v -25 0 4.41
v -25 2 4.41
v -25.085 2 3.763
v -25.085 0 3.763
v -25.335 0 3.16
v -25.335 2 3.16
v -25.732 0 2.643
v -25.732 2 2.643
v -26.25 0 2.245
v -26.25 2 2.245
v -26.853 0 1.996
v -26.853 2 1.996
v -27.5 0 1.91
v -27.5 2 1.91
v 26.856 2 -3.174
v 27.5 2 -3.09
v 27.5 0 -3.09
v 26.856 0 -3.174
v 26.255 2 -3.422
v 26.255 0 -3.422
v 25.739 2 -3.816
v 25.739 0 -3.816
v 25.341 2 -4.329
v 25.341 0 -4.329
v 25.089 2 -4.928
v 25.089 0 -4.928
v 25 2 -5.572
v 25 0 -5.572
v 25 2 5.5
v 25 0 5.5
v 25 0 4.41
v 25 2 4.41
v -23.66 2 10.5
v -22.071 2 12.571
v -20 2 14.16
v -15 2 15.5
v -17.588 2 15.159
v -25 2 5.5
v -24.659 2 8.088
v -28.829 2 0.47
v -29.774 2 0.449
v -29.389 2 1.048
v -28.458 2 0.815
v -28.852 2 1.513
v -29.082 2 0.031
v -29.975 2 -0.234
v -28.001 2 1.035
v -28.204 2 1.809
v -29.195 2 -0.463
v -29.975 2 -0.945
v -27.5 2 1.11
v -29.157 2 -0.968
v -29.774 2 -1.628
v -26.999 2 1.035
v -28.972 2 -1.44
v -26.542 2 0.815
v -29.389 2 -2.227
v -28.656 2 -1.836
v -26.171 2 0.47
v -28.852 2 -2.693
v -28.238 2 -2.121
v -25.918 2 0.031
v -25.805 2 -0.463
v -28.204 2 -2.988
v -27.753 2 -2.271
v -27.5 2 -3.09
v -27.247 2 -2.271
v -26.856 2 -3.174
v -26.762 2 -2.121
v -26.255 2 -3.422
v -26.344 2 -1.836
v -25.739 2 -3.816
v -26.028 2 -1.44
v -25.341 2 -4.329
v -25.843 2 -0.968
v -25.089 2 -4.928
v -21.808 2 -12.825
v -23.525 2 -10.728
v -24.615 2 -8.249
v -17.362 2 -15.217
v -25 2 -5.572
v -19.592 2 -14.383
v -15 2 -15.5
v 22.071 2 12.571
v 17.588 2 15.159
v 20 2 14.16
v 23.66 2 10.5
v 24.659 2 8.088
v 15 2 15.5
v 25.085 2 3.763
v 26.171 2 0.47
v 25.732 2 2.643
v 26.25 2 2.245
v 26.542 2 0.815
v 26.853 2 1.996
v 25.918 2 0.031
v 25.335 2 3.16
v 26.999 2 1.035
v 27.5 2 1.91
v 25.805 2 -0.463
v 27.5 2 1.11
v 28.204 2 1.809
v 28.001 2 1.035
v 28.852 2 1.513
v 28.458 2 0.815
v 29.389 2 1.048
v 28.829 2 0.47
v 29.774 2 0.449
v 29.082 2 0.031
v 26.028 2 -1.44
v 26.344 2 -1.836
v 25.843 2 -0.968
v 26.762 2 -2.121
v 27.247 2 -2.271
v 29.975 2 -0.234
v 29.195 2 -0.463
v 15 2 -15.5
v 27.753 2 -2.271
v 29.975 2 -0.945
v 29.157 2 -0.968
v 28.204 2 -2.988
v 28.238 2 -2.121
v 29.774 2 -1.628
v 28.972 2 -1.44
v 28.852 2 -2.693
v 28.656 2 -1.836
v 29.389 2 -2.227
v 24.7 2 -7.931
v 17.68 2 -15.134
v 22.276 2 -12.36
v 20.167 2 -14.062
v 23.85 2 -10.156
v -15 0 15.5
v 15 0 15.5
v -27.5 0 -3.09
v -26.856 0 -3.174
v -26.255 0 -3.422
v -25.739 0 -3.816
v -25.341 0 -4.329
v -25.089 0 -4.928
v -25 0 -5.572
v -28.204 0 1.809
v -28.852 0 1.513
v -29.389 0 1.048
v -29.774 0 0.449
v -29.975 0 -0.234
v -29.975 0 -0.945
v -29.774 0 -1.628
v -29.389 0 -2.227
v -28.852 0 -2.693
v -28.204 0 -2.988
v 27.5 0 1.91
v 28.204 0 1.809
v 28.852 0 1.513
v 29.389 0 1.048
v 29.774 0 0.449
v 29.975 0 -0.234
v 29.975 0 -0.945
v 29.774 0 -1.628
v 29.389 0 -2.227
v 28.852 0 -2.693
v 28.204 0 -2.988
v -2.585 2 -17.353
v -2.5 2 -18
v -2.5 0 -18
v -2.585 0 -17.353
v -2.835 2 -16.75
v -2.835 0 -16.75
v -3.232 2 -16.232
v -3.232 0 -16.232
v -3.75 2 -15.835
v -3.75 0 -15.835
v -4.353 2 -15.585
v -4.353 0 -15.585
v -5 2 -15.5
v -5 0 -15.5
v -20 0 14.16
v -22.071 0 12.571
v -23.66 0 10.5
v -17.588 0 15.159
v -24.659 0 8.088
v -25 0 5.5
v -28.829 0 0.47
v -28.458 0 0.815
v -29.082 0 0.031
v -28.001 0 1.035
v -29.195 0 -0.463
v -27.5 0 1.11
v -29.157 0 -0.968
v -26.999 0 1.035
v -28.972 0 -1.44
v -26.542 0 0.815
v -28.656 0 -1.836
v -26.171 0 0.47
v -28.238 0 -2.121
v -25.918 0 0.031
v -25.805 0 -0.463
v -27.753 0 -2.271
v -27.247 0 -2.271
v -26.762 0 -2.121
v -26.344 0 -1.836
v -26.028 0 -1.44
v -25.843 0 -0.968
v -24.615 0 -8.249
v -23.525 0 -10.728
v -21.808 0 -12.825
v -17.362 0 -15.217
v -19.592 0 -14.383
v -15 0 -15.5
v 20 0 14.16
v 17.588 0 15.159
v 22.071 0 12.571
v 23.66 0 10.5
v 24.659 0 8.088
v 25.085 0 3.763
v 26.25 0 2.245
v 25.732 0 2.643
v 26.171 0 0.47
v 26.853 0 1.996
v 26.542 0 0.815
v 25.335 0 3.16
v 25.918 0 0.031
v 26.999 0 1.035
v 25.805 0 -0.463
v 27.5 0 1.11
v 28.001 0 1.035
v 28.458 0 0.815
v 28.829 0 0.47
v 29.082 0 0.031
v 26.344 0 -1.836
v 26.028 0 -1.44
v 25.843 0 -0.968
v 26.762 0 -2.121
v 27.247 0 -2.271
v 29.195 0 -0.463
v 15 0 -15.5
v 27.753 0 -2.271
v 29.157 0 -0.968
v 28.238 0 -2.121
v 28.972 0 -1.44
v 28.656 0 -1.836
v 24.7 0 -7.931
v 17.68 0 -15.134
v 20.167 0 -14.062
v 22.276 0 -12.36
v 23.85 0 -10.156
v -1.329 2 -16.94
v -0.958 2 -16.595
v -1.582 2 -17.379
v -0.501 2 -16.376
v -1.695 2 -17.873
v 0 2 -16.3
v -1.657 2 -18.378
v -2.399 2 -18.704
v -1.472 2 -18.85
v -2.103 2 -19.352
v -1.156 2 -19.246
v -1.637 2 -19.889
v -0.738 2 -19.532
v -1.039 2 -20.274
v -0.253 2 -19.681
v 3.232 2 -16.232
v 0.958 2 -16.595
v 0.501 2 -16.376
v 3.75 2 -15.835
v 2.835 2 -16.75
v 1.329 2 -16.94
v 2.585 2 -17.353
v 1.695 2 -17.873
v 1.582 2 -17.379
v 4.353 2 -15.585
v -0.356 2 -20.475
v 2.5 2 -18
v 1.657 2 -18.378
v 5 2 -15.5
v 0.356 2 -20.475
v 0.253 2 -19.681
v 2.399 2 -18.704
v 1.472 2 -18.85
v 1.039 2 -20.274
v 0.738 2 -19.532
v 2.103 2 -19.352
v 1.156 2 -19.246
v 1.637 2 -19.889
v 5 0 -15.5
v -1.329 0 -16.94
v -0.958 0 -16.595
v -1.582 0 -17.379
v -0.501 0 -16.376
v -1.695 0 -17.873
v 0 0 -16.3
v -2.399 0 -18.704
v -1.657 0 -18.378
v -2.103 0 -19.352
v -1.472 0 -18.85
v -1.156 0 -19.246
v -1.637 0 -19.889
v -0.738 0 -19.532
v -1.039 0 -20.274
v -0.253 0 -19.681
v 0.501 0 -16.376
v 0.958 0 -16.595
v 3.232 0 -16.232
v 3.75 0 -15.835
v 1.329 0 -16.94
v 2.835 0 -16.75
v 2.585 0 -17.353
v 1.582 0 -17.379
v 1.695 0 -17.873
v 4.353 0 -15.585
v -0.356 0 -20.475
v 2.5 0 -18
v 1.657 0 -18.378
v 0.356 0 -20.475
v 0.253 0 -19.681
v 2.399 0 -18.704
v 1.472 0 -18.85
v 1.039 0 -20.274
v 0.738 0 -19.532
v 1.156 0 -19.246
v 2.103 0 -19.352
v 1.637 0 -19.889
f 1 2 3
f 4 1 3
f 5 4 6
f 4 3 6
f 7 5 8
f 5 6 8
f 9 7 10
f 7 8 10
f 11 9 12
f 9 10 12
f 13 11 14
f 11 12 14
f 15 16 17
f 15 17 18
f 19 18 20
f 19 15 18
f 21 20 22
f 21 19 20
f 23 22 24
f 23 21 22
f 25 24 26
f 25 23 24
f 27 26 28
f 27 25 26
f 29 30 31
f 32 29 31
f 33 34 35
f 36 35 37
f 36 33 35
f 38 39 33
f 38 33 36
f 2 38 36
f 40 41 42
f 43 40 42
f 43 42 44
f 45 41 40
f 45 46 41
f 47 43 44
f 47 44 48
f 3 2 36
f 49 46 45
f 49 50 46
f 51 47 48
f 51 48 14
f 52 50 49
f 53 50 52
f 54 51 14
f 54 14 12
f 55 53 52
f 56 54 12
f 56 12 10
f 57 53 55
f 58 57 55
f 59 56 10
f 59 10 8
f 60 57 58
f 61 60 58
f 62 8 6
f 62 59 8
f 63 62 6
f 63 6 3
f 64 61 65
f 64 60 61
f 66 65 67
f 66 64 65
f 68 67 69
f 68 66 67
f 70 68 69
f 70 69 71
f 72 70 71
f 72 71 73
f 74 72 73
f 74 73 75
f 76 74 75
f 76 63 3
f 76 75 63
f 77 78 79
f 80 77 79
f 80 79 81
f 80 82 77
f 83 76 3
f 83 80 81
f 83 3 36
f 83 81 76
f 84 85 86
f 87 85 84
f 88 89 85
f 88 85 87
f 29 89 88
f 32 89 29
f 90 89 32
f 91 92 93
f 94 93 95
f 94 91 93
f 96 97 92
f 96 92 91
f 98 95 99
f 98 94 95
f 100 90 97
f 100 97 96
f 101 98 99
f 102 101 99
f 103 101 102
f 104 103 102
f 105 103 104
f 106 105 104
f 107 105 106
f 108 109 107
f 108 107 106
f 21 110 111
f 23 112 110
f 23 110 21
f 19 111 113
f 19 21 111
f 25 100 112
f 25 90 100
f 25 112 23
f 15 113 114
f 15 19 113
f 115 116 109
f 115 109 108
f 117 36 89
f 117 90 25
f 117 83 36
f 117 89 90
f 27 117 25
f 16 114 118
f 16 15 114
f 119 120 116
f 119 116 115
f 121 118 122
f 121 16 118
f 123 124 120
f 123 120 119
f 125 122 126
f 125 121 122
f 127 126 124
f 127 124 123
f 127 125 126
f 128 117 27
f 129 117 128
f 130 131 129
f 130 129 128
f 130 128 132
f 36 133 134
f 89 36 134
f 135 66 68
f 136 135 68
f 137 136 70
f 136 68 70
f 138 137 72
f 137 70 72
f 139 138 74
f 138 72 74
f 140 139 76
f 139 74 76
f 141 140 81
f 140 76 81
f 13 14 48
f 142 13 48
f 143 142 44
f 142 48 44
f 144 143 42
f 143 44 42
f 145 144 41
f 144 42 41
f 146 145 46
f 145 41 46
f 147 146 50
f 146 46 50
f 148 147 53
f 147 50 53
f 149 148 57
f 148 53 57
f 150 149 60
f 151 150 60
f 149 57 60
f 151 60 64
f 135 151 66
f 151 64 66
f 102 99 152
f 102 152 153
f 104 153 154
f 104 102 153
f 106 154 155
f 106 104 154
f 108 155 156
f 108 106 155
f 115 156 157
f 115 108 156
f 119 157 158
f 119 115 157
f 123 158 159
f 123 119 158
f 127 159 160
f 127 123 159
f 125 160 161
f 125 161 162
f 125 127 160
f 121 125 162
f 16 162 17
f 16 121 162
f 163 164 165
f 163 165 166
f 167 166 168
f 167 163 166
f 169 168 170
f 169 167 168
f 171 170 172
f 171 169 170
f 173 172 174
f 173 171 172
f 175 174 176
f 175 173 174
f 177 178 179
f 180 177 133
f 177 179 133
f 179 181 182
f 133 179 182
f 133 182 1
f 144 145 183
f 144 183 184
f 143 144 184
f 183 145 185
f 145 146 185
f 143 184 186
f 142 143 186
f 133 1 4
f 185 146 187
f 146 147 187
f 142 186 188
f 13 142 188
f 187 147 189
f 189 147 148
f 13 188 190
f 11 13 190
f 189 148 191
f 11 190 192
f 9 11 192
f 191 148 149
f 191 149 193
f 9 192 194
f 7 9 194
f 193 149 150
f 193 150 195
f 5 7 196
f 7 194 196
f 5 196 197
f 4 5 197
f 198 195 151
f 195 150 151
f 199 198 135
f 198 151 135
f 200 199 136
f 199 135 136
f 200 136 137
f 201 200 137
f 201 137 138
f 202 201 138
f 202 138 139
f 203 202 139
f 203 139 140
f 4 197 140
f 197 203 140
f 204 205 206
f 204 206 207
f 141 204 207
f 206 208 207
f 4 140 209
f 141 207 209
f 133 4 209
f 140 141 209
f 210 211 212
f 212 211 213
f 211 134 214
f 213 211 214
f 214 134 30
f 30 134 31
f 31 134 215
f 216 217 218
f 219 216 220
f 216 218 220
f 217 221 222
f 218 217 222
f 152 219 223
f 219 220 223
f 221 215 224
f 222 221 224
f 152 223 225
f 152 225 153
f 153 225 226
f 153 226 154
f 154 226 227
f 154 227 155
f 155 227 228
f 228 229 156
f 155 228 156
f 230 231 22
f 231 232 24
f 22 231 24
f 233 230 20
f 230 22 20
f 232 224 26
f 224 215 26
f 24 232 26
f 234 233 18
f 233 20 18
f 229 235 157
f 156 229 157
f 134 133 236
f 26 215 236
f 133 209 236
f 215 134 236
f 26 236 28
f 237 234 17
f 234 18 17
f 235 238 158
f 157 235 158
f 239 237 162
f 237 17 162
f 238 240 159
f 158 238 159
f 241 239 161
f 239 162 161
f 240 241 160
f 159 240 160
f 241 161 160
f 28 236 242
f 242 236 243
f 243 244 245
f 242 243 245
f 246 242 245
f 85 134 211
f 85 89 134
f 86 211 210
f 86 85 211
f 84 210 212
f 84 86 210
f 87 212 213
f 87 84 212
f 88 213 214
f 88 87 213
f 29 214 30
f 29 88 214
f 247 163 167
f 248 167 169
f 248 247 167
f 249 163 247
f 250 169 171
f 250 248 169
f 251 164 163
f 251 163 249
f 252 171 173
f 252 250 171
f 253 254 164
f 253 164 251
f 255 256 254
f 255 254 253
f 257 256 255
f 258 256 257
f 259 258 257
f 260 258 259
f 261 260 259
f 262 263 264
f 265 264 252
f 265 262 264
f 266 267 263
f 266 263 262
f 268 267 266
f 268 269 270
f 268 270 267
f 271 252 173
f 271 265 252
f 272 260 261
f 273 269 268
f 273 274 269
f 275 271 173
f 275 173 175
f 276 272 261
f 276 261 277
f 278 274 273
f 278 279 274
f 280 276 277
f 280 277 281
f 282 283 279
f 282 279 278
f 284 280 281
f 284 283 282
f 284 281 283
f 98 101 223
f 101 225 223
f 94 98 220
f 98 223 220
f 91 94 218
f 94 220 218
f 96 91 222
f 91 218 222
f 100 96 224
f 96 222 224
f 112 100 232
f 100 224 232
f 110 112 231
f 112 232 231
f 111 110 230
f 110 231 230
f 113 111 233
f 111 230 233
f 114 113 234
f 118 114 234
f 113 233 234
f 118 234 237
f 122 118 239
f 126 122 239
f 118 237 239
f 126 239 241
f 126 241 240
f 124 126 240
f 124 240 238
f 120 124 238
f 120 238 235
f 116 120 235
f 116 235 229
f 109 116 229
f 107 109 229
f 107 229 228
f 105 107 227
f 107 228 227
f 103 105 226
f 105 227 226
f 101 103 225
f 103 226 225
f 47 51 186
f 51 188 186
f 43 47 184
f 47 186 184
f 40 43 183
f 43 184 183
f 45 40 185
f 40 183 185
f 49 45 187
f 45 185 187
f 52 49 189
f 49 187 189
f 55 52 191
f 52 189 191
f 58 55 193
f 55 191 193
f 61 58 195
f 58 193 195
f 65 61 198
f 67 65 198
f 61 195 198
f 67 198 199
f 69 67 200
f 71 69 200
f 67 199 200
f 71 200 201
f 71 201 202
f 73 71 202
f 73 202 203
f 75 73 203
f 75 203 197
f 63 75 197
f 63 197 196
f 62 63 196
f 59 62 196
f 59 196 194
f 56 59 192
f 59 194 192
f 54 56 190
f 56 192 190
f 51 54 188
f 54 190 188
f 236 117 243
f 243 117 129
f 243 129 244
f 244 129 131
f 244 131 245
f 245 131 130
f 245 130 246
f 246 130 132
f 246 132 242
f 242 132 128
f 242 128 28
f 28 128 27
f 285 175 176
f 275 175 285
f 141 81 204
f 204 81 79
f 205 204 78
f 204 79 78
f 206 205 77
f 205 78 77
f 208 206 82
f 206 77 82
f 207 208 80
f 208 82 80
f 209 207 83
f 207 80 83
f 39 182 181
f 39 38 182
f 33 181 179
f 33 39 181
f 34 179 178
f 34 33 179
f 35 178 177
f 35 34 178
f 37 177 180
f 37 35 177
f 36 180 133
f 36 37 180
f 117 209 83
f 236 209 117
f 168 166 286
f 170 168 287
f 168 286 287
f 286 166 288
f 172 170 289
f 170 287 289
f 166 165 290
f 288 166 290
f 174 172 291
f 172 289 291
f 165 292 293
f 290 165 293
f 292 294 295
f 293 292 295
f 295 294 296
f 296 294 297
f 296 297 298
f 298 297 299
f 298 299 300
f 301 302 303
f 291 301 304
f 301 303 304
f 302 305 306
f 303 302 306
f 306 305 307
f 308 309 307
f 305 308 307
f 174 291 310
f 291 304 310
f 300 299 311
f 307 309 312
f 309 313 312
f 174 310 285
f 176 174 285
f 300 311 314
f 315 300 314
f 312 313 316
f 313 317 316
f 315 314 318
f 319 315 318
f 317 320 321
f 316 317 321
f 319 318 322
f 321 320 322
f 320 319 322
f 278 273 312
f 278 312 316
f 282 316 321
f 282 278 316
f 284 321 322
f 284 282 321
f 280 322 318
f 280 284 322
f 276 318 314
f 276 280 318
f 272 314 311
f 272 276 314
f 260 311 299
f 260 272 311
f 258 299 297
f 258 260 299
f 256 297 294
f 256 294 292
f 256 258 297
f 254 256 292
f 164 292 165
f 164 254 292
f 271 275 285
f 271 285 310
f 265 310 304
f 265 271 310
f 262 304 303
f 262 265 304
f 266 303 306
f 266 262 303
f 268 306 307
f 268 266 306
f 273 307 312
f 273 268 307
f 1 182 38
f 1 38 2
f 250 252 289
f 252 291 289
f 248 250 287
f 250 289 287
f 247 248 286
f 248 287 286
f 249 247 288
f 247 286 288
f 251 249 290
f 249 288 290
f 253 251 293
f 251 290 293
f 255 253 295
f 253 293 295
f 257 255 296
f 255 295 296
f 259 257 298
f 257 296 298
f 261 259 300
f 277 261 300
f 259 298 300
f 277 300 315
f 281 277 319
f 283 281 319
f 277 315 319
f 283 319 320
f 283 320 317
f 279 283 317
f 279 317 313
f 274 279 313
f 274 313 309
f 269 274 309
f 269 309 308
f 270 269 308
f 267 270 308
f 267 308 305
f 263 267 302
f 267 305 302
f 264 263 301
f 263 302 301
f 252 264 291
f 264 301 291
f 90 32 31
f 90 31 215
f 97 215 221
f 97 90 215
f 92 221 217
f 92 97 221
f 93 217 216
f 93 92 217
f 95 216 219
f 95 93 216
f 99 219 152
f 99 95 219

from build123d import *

# Parameters (mm, degrees)
SKETCH_1_W                  = 50
SKETCH_1_H                  = 31
EXTRUDE_1_DEPTH             = 2
EXTRUDE_2_DEPTH             = 2
EXTRUDE_3_DEPTH             = 2
SKETCH_5_W                  = 1.7
SKETCH_5_H                  = 2
HOLE_WIZARD_M3_1_AT_2_COUNT = 2
HOLE_WIZARD_M3_1_AT_2_PITCH = 32.547968148
HOLE_WIZARD_M3_1_AT_3_COUNT = 2
HOLE_WIZARD_M3_1_AT_3_PITCH = 32.547968148
FILLET_1_R                  = 10


with BuildPart() as part:
    # 草图1 → 凸台-拉伸1 (new body)
    with BuildSketch(Plane(origin=(0, 0, 0), x_dir=(1, 0, 0), z_dir=(0, 1, 0))):
        Rectangle(SKETCH_1_W, SKETCH_1_H)
    extrude(amount=EXTRUDE_1_DEPTH)

    # 草图6 → 凸台-拉伸3 (add)
    with BuildSketch(Plane(origin=(0, 2, 0), x_dir=(1, 0, 0), z_dir=(0, 1, 0))):
        with BuildLine():
            Line((-25, 5.589651624), (-25, -4.410348376))
            ThreePointArc((-25, -4.410348376), (-25.732233047, -2.642581423), (-27.5, -1.910348376))
            ThreePointArc((-27.5, -1.910348376), (-30, 0.589651624), (-27.5, 3.089651624))
            ThreePointArc((-27.5, 3.089651624), (-25.732233047, 3.821884671), (-25, 5.589651624))
        make_face()
        with BuildLine():
            Line((25, 5.589651624), (25, -4.410348376))
            ThreePointArc((25, -4.410348376), (25.732233047, -2.642581423), (27.5, -1.910348376))
            ThreePointArc((27.5, -1.910348376), (30, 0.589651624), (27.5, 3.089651624))
            ThreePointArc((27.5, 3.089651624), (25.732233047, 3.821884671), (25, 5.589651624))
        make_face()
    extrude(amount=-EXTRUDE_3_DEPTH)


with BuildPart() as body_2:
    # 草图2 → 凸台-拉伸2 (new body)
    with BuildSketch(Plane(origin=(0, 2, 0), x_dir=(1, 0, 0), z_dir=(0, 1, 0))):
        with BuildLine():
            Line((-5, 15.5), (5, 15.5))
            ThreePointArc((5, 15.5), (3.232233047, 16.232233047), (2.5, 18))
            ThreePointArc((2.5, 18), (0, 20.5), (-2.5, 18))
            ThreePointArc((-2.5, 18), (-3.232233047, 16.232233047), (-5, 15.5))
        make_face()
    extrude(amount=-EXTRUDE_2_DEPTH)

    # 草图5 → M3 间隙孔1 (revolve, cut)
    with BuildSketch(Plane(origin=(0, 2, -18), x_dir=(0, 0, 1), z_dir=(1, 0, 0))):
        with Locations((0.85, 1)):
            Rectangle(SKETCH_5_W, SKETCH_5_H)
    hole_wizard_m3_1 = revolve(axis=Axis((0, 8.35, -18), (0, -1, 0)), mode=Mode.SUBTRACT)


with BuildPart() as part_1:
    add(part.part)

    # M3 间隙孔1 at 2: M3 间隙孔1 ×2
    with Locations(*[Vector(-0.8449068118474433, 0, 0.5349135250615646) * (i * HOLE_WIZARD_M3_1_AT_2_PITCH) for i in range(1, HOLE_WIZARD_M3_1_AT_2_COUNT)]):
        add(hole_wizard_m3_1, mode=Mode.SUBTRACT)

    # M3 间隙孔1 at 3: M3 间隙孔1 ×2
    with Locations(*[Vector(0.8449068118474434, 0, 0.5349135250615644) * (i * HOLE_WIZARD_M3_1_AT_3_PITCH) for i in range(1, HOLE_WIZARD_M3_1_AT_3_COUNT)]):
        add(hole_wizard_m3_1, mode=Mode.SUBTRACT)

    # 圆角1
    fillet_1_edges = [part_1.edges().sort_by_distance(p)[0] for p in [
        (25, 1, -15.5),
        (-25, 1, -15.5),
        (25, 1, 15.5),
        (-25, 1, 15.5),
    ]]
    fillet(fillet_1_edges, radius=FILLET_1_R)


solid = Compound([body_2.part, part_1.part])
